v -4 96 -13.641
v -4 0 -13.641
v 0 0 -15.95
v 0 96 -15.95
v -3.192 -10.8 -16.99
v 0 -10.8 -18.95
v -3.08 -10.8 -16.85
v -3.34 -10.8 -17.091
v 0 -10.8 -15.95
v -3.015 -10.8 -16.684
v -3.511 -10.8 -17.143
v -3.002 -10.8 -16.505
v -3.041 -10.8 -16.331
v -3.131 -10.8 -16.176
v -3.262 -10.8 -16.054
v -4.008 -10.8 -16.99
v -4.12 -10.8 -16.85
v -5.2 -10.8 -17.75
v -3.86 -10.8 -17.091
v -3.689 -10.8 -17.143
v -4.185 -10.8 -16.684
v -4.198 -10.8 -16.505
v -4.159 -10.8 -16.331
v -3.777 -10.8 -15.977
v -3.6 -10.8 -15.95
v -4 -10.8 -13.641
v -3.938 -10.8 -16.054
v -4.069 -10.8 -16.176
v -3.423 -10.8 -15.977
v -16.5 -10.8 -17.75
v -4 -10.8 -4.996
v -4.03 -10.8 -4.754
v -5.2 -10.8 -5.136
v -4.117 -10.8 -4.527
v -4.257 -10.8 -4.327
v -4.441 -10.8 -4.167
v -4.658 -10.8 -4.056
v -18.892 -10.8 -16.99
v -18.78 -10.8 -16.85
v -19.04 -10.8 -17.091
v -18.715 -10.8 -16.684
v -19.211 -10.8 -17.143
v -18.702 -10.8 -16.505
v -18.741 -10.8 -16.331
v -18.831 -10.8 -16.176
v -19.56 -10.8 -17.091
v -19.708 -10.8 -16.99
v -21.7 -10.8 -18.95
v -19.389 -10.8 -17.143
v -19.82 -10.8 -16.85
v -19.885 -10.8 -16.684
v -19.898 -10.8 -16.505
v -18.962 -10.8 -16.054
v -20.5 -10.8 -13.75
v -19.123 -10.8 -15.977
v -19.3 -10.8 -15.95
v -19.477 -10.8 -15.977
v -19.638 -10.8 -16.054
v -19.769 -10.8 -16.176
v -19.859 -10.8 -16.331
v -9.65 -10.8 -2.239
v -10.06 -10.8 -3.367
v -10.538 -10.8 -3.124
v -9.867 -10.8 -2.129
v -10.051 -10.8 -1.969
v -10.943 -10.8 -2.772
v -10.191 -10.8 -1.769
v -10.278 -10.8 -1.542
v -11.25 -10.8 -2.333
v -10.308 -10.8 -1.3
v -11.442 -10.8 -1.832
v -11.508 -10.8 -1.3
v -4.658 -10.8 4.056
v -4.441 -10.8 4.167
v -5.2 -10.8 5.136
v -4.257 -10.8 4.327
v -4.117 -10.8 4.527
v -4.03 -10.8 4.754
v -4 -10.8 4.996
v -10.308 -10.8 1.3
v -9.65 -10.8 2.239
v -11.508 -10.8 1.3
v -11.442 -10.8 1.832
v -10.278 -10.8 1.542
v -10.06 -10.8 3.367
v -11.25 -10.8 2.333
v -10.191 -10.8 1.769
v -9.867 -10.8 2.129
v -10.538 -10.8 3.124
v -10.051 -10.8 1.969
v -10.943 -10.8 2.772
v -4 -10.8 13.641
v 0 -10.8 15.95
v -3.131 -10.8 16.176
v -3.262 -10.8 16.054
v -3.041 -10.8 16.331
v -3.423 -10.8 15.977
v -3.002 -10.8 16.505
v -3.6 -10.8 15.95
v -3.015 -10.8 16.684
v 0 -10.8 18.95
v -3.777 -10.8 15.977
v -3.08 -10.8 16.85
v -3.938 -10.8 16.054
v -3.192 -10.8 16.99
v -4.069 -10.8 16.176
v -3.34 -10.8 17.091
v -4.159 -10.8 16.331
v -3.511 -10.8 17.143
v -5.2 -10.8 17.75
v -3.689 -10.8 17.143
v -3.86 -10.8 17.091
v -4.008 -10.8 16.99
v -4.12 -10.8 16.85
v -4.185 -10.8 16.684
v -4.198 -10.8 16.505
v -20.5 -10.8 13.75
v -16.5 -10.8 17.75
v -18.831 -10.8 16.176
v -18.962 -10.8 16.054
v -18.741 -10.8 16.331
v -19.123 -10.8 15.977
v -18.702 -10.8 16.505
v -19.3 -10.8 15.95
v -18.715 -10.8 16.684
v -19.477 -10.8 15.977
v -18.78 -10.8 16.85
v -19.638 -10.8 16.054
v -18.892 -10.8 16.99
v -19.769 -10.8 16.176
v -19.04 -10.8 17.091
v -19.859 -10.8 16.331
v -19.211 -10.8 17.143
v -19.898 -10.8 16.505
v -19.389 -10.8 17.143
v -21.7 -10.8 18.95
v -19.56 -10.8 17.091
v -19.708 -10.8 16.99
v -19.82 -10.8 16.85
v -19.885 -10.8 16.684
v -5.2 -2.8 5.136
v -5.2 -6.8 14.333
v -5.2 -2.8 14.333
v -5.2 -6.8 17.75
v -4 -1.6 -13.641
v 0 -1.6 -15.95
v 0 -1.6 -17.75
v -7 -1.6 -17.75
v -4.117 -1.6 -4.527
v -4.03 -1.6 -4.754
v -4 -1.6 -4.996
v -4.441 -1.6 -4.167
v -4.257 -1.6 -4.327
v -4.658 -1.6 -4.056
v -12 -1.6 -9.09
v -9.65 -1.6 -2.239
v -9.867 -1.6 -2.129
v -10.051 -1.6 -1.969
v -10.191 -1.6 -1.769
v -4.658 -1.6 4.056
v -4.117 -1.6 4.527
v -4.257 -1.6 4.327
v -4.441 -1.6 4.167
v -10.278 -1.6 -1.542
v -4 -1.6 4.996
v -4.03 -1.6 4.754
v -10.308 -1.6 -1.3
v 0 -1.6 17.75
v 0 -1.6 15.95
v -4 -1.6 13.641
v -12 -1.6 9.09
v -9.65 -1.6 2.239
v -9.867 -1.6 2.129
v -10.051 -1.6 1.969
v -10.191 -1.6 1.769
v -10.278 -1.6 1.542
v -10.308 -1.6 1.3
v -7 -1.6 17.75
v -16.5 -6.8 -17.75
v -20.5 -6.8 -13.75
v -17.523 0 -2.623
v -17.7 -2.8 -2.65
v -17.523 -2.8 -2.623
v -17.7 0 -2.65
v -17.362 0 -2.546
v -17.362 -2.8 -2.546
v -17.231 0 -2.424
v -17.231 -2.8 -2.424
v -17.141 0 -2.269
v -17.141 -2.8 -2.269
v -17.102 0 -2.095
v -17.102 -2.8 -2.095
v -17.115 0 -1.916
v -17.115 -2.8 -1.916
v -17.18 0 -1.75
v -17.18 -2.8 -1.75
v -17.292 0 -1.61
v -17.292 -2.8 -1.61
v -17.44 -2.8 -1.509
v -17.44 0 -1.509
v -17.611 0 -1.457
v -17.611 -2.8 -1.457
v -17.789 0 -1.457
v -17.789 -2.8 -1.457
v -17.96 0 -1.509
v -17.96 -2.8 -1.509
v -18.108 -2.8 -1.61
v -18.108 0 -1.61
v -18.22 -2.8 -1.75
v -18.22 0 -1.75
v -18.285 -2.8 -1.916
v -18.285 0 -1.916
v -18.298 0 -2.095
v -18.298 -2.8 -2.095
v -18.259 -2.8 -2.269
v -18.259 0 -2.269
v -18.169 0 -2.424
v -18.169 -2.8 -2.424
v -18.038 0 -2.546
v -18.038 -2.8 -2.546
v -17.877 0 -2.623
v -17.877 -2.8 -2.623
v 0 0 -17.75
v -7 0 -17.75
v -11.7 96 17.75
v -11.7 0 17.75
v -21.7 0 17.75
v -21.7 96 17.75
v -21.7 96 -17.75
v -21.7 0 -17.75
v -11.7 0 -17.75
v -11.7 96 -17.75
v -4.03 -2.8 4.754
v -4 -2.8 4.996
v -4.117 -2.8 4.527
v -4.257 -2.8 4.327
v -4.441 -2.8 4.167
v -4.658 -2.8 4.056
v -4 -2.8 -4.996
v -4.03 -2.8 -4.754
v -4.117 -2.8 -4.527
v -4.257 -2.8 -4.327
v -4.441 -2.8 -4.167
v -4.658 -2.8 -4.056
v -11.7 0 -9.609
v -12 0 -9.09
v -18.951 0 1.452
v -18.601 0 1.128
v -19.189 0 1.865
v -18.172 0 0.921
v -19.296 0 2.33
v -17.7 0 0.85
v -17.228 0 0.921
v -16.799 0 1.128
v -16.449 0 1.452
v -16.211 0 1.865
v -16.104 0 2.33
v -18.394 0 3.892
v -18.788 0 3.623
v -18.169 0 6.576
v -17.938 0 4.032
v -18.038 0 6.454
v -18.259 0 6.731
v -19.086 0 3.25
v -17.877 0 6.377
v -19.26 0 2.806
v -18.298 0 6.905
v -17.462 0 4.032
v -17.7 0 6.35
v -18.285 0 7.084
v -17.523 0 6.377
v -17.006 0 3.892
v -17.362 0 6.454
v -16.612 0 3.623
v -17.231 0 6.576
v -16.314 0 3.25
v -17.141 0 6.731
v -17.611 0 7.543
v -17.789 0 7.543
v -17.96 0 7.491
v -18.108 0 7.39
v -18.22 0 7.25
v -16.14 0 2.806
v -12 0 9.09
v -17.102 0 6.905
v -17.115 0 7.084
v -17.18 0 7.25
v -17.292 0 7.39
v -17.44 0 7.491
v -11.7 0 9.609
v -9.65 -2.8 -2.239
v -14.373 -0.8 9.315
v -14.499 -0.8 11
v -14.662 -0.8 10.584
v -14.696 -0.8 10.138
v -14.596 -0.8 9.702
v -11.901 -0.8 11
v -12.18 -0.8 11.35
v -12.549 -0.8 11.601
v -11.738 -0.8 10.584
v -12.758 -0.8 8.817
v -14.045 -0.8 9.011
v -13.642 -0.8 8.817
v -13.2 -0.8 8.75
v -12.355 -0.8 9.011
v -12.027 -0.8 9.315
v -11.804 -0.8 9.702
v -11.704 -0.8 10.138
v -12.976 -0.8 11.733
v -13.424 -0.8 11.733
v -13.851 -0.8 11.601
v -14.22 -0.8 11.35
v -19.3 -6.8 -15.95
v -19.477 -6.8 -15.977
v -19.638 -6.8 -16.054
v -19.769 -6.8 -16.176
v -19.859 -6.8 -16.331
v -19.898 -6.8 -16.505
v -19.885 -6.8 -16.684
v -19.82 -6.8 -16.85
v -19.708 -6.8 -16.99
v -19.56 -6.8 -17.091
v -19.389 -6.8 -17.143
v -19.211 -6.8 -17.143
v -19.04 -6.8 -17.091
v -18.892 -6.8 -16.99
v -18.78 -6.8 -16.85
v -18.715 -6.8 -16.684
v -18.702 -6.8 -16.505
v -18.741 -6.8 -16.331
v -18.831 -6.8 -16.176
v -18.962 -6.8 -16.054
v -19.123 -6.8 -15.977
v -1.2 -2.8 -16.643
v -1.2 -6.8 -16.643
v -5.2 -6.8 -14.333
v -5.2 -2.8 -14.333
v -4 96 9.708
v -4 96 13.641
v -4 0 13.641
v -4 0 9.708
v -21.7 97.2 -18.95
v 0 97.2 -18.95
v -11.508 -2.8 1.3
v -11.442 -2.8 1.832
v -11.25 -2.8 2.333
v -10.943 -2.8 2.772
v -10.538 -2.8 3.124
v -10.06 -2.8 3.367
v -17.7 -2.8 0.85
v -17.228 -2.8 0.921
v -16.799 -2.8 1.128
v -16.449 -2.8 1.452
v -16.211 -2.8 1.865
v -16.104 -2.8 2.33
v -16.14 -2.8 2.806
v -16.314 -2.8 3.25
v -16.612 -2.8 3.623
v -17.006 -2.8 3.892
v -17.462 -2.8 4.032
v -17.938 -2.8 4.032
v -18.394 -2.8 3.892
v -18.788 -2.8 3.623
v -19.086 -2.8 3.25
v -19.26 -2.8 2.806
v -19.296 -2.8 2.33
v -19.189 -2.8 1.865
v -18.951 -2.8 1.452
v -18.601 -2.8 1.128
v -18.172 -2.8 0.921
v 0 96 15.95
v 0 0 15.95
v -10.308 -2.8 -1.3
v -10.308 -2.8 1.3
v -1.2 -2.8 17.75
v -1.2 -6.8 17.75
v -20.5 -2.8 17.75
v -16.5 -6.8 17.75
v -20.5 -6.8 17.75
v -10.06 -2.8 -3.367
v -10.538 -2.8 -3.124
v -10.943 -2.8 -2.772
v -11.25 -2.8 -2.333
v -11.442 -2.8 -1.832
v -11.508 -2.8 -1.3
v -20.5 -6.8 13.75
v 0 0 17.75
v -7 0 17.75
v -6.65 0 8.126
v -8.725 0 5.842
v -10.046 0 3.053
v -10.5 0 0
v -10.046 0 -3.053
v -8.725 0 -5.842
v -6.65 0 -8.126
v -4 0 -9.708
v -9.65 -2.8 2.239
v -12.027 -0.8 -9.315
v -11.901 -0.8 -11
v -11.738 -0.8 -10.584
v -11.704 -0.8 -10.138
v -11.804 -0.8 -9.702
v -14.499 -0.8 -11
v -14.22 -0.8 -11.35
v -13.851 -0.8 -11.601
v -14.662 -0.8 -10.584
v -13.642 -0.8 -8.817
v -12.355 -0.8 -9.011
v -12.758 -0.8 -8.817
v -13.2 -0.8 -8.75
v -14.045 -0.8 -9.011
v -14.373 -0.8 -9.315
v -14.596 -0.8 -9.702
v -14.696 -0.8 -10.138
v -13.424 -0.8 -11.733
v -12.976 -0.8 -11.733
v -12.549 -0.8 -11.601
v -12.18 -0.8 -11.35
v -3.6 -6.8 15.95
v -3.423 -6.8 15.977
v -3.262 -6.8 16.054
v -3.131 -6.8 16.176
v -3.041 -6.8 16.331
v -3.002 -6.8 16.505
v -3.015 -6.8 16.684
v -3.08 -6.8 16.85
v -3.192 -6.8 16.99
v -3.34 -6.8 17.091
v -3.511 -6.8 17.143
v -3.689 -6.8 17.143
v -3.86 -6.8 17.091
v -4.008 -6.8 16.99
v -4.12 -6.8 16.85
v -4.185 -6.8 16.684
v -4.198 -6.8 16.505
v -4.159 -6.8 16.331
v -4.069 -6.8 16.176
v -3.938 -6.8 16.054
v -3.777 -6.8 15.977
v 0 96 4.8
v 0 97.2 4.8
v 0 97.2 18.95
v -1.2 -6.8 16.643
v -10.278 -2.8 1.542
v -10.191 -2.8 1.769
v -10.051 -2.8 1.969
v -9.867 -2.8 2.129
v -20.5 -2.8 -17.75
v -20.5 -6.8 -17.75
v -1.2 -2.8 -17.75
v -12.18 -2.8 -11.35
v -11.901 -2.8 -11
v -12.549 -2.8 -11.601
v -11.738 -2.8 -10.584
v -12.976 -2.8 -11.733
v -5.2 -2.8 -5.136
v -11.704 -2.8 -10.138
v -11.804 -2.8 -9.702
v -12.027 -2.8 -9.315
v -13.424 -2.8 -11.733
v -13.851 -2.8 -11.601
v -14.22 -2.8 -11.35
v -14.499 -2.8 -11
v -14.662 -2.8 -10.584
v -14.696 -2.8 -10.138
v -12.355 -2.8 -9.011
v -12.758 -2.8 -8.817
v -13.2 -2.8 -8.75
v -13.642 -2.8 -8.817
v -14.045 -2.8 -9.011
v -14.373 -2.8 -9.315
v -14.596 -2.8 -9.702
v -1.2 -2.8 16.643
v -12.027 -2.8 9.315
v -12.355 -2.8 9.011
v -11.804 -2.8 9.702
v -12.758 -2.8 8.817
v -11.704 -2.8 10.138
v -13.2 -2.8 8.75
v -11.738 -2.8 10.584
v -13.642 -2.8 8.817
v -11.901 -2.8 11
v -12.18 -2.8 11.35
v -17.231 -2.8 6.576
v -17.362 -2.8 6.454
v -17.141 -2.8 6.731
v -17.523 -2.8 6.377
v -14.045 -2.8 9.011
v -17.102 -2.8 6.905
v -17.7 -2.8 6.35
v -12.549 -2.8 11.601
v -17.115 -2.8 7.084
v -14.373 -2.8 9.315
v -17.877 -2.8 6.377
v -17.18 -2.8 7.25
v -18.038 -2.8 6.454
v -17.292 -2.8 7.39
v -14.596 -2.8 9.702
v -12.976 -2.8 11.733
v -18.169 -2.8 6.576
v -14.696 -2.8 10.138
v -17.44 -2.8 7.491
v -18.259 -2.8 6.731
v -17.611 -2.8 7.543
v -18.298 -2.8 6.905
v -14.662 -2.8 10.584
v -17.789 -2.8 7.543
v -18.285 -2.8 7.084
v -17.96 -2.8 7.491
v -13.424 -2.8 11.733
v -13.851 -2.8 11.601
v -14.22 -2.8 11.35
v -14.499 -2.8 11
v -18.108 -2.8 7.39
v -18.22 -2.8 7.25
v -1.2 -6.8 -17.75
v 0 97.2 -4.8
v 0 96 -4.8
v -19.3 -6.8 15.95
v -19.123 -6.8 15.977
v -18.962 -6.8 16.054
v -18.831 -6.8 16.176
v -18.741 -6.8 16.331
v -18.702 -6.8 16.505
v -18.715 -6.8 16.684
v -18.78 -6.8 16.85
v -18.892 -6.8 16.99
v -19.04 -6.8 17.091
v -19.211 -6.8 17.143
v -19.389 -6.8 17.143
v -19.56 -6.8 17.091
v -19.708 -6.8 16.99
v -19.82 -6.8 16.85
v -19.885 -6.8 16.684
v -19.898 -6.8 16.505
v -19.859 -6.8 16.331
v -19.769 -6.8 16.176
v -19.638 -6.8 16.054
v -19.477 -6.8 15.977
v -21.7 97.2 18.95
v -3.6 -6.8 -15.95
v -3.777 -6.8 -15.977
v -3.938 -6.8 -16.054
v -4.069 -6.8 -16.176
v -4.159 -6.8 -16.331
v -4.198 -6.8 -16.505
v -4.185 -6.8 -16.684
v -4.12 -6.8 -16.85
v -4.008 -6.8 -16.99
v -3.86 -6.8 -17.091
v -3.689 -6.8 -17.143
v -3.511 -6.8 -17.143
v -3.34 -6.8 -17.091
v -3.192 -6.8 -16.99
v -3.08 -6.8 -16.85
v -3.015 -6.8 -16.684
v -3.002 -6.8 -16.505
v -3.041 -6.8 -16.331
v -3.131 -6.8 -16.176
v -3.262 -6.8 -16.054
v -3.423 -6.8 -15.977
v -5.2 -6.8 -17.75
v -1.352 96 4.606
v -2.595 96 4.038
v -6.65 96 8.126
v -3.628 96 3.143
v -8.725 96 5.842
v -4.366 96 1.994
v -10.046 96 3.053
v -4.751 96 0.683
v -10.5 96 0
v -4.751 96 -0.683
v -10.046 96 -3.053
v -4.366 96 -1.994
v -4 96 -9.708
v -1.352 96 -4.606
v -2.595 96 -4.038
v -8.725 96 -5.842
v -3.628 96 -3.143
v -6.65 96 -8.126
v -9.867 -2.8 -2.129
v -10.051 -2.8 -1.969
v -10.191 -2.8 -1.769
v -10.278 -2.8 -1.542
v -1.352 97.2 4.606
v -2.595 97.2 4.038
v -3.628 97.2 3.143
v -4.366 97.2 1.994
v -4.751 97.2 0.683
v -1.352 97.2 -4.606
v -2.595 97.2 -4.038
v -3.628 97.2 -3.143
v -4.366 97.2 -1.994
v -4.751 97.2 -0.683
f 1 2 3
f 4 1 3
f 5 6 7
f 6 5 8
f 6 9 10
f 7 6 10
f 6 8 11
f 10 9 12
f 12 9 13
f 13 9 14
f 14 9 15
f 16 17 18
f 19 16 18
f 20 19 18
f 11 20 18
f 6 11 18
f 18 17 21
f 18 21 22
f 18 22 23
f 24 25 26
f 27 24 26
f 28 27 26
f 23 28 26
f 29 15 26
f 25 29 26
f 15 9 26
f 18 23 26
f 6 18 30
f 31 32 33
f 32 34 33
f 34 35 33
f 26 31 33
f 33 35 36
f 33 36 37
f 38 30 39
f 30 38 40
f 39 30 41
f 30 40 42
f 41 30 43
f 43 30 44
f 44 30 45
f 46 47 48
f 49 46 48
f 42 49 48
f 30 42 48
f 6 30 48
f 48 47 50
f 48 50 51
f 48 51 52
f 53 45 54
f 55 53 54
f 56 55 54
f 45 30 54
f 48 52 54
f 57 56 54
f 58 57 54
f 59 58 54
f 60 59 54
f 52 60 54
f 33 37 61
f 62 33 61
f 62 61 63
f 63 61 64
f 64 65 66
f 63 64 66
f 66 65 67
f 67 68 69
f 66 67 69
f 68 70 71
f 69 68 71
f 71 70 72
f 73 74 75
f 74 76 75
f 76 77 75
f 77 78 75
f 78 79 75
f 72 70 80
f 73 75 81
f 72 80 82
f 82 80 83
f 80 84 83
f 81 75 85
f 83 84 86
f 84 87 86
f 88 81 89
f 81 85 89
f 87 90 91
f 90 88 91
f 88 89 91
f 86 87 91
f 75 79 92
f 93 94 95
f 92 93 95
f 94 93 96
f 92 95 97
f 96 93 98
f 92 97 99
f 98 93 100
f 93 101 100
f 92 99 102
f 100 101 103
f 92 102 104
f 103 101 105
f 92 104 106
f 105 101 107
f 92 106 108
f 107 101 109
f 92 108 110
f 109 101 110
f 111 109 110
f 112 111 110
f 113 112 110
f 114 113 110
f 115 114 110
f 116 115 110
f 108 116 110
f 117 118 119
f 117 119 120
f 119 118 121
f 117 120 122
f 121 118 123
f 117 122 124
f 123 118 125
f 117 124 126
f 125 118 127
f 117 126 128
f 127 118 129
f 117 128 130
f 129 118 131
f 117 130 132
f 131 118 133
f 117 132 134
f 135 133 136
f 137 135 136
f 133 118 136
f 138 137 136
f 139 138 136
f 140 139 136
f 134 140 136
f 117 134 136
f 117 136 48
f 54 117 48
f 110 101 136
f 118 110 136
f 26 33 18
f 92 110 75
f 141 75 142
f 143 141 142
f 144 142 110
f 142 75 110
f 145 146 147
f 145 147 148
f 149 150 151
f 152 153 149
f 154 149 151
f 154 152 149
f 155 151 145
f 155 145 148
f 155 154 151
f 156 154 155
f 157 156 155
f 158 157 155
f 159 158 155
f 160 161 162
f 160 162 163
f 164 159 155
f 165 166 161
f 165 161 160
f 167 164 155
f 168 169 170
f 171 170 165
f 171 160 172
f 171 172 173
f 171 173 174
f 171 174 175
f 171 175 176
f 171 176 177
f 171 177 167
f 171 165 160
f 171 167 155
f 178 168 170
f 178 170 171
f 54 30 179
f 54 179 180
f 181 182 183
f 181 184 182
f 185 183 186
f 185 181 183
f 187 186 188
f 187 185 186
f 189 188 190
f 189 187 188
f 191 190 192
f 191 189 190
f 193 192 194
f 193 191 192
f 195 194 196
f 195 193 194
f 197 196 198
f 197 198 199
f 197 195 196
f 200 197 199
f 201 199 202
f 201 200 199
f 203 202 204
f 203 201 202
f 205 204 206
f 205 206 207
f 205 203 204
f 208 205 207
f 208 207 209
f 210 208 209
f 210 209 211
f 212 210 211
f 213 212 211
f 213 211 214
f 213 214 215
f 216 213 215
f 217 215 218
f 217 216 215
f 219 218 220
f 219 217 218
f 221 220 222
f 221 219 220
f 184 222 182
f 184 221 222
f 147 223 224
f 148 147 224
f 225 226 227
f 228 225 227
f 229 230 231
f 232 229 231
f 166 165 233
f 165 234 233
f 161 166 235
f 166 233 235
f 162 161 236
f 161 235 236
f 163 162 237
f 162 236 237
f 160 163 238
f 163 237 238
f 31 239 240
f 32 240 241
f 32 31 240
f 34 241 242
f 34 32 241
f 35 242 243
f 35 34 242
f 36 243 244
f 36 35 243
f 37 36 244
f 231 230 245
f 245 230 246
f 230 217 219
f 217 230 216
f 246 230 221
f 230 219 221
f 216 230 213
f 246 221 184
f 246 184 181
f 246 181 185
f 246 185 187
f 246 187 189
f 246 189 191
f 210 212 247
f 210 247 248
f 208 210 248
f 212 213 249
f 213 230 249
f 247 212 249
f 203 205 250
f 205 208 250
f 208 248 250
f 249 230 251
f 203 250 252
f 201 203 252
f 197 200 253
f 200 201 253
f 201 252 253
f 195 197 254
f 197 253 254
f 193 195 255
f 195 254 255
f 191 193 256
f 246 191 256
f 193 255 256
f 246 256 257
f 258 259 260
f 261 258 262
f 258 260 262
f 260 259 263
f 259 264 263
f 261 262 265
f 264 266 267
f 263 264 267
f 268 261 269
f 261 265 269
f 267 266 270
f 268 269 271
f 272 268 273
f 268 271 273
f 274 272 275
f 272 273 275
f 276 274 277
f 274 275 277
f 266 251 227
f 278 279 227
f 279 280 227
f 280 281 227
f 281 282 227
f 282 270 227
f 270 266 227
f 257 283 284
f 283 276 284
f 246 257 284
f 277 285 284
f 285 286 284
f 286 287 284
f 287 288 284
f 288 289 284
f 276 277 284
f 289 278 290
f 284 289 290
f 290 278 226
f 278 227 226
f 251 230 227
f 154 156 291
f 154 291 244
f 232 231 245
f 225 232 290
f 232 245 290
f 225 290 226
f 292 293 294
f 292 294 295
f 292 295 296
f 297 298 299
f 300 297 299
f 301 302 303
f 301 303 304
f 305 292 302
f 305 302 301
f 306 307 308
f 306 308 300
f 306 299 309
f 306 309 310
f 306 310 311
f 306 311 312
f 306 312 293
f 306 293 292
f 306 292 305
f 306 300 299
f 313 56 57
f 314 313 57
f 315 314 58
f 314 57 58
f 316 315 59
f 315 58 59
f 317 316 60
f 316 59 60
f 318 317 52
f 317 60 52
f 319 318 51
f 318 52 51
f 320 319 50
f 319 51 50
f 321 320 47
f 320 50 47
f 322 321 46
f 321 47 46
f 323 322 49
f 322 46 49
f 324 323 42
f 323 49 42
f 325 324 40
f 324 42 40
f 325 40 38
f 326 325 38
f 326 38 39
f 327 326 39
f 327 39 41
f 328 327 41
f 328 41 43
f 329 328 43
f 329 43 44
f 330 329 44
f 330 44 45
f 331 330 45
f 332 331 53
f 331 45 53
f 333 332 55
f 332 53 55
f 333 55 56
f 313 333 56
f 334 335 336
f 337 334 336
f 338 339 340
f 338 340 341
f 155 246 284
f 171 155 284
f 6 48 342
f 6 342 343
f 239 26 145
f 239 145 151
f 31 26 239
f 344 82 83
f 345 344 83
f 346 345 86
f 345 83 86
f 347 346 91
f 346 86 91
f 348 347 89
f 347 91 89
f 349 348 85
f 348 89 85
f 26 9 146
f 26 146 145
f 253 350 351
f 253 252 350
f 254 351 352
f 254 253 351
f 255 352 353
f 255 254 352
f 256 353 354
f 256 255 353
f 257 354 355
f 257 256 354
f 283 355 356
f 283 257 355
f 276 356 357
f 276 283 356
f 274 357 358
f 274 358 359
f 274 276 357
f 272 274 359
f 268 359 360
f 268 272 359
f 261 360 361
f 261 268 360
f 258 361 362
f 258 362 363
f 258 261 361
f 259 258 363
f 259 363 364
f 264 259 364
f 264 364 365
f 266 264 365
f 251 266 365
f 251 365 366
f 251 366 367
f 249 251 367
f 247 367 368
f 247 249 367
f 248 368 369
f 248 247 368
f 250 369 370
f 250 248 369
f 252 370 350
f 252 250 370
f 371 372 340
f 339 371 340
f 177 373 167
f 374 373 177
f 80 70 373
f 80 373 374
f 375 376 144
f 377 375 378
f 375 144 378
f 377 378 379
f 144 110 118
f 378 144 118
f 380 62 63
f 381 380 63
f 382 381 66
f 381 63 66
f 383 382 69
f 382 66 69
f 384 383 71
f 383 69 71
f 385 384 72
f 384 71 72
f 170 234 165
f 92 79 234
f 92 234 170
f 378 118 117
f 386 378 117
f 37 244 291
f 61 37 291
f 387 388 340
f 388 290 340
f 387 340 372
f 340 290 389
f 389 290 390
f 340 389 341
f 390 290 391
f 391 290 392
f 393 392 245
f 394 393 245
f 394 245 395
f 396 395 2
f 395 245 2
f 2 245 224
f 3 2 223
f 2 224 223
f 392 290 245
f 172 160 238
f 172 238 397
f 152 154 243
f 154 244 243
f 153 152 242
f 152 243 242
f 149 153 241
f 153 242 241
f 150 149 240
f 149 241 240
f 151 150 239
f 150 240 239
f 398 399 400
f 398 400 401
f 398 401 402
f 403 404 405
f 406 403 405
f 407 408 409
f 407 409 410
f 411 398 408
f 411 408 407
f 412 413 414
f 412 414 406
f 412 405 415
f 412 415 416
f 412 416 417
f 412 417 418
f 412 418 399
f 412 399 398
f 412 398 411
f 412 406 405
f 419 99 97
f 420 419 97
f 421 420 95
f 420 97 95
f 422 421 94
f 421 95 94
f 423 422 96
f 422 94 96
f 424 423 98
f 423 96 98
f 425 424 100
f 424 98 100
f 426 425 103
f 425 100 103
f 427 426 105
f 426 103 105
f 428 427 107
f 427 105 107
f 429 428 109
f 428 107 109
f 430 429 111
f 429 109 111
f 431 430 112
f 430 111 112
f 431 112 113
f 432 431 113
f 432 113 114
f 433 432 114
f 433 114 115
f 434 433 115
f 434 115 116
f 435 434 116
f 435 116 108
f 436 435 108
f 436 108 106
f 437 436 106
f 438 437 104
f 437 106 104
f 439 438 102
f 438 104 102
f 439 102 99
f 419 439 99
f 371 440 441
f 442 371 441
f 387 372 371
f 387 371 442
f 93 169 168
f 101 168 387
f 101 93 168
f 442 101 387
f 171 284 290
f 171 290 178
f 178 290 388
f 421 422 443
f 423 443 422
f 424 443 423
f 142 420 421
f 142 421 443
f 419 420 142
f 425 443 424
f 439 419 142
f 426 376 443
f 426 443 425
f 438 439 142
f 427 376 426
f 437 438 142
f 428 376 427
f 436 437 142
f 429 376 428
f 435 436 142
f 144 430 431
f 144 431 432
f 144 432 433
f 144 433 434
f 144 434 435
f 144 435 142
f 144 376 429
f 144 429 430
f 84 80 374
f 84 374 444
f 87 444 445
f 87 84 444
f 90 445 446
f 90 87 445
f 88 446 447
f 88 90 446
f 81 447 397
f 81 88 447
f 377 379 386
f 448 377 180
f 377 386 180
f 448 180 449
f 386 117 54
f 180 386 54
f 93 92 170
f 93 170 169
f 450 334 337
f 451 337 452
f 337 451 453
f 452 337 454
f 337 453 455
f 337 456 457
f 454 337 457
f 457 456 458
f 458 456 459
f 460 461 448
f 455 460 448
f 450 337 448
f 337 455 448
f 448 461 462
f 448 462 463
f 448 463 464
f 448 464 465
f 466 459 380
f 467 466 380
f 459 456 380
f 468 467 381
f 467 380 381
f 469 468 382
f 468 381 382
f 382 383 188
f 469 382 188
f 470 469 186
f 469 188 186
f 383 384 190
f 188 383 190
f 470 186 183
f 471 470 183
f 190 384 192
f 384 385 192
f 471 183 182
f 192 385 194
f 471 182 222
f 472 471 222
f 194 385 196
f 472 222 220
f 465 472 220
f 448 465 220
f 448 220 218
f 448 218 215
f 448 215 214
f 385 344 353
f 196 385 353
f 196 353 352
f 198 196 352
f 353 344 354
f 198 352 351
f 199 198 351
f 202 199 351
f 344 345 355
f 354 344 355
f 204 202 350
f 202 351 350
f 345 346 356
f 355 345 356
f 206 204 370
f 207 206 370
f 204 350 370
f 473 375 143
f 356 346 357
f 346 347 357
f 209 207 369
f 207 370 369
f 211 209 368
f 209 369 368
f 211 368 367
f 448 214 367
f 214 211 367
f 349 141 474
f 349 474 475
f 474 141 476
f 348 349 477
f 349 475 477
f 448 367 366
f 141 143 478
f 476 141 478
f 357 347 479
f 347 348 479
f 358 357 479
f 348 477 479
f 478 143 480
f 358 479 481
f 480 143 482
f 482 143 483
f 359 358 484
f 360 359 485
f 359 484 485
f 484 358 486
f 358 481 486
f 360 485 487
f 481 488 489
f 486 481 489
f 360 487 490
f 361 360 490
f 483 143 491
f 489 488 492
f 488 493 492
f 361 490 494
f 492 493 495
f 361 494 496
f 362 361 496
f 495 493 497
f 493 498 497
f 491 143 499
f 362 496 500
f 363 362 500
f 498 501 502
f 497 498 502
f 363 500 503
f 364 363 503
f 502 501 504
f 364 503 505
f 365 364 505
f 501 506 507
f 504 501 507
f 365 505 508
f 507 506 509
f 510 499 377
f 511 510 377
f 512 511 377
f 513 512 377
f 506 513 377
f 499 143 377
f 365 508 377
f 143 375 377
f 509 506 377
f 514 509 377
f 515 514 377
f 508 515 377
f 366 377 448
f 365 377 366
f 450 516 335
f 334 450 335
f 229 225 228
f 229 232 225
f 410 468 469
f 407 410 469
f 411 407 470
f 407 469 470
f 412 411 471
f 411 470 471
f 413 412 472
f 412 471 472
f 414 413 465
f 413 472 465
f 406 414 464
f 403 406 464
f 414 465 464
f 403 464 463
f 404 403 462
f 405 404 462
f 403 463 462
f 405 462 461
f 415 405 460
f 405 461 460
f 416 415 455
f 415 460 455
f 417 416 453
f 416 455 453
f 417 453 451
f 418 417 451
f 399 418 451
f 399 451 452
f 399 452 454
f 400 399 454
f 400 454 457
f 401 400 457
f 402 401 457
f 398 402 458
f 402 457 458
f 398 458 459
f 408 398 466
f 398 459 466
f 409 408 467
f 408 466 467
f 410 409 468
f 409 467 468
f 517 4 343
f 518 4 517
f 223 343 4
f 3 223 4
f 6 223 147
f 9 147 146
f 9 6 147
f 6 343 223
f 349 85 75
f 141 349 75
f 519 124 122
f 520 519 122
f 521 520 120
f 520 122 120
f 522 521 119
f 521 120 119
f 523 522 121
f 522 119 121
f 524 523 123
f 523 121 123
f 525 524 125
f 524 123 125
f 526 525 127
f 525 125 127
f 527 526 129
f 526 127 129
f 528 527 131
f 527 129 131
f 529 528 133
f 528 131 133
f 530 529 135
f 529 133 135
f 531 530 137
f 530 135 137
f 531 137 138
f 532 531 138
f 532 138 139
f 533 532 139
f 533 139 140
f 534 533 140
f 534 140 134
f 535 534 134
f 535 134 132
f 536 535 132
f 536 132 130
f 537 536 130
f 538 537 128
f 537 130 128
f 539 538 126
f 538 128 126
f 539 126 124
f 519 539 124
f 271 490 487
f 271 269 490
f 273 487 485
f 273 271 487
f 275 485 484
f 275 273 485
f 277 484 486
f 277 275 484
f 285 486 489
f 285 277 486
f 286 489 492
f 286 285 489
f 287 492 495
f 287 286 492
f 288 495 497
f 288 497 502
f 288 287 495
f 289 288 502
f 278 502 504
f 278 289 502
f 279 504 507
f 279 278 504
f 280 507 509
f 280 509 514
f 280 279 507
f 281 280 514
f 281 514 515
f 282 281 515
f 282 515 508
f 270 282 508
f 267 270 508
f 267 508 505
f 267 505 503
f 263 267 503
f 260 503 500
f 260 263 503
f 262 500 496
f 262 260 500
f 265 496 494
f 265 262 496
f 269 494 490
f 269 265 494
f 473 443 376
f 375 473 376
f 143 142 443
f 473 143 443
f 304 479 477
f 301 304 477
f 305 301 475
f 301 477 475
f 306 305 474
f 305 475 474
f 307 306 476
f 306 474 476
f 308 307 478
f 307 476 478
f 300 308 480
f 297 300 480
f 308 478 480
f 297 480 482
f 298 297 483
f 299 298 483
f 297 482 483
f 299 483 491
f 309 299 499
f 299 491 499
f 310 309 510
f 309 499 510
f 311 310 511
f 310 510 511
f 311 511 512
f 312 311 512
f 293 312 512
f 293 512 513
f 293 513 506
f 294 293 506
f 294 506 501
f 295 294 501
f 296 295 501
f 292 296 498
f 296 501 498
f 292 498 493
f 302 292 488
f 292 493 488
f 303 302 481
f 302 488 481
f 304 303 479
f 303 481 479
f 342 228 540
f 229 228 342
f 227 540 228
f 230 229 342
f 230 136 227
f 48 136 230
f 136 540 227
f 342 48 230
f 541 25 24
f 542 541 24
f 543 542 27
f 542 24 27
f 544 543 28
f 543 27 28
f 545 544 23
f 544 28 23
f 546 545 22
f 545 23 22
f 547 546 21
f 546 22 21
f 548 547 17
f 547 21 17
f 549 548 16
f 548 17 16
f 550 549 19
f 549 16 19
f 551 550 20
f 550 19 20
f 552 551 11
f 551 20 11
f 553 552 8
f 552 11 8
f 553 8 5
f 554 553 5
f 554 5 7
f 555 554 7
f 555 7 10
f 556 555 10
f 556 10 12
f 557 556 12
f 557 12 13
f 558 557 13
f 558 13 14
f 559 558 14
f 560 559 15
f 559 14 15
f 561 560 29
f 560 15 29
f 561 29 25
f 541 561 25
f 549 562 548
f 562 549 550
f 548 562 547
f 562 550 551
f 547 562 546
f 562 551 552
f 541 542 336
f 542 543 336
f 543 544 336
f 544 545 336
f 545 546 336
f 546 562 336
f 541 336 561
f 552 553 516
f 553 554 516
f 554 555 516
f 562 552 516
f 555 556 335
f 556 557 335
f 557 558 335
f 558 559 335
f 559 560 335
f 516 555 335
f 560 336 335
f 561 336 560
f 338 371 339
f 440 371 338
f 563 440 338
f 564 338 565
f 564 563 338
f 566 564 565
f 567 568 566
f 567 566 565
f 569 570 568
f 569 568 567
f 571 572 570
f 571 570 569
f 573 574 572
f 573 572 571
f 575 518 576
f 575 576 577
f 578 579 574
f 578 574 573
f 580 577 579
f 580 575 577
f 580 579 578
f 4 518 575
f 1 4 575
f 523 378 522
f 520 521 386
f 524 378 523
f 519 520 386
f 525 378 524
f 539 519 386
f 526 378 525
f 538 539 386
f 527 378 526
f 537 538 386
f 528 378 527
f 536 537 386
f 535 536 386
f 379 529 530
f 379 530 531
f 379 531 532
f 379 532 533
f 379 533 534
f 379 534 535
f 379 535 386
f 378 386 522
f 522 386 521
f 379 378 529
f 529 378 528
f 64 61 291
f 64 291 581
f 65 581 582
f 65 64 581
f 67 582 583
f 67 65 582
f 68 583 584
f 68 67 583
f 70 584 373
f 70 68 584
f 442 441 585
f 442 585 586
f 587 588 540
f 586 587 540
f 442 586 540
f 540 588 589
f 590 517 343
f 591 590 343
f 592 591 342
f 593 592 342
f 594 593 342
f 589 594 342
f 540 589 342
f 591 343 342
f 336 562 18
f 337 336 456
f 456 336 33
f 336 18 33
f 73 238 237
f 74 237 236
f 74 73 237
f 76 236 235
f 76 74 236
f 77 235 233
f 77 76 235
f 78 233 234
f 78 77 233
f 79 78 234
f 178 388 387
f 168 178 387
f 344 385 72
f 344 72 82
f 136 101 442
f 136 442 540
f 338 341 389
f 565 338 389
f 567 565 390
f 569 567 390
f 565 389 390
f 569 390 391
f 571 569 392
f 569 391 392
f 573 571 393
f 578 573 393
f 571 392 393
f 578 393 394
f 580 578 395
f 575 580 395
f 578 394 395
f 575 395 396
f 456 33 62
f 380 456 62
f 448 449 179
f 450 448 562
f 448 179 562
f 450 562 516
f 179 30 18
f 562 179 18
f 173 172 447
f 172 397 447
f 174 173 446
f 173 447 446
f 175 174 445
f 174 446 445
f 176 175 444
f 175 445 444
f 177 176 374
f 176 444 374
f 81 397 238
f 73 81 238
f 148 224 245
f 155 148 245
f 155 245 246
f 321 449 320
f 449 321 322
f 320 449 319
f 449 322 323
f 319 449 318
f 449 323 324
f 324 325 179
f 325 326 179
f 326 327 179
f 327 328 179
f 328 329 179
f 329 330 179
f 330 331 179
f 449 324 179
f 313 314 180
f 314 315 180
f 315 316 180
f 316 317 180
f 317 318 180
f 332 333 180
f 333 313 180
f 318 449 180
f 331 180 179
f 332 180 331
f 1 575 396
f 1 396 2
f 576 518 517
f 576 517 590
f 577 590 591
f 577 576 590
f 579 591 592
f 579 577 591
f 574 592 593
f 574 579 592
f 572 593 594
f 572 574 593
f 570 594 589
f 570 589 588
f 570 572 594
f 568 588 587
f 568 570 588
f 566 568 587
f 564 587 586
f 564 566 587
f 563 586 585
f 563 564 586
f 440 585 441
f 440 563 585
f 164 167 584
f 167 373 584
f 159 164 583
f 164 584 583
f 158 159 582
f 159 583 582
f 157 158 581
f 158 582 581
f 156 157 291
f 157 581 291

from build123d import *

# Parameters (mm, degrees)
EXTRUDE_1_DEPTH     = 96
EXTRUDE_2_DEPTH     = 1.2
SKETCH_3_R          = 1.6
SKETCH_3_R_2        = 0.6
EXTRUDE_3_DEPTH     = 1.6
SKETCH_4_R          = 0.6
SKETCH_4_R_2        = 1.6
EXTRUDE_4_DEPTH     = 1.2
FILLET_1_R          = 1
SKETCH_5_R          = 1.5
CUT_EXTRUDE_1_DEPTH = 2
SKETCH_6_R          = 1.5
CUT_EXTRUDE_2_DEPTH = 2
EXTRUDE_START       = 8
EXTRUDE_6_DEPTH     = 8
SKETCH_10_R         = 0.6
EXTRUDE_7_DEPTH     = 4


with BuildPart() as part:
    # Эскиз1 → Бобышка-Вытянуть1 (new body)
    with BuildSketch(Plane(origin=(0, 0, 0), x_dir=(1, 0, 0), z_dir=(0, 1, 0))):
        with BuildLine():
            Line((0, -18.95), (0, -15.95))
            Line((0, -15.95), (-4, -13.640598923))
            Line((-4, -13.640598923), (-4, -9.708243919))
            ThreePointArc((-4, -9.708243919), (-10.5, 0), (-4, 9.708243919))
            Line((-4, 9.708243919), (-4, 13.640598923))
            Line((-4, 13.640598923), (0, 15.95))
            Line((0, 15.95), (0, 18.95))
            Line((0, 18.95), (-21.7, 18.95))
            Line((-21.7, 18.95), (-21.7, 17.75))
            Line((-21.7, 17.75), (-11.7, 17.75))
            Line((-11.7, 17.75), (-11.7, -17.75))
            Line((-11.7, -17.75), (-21.7, -17.75))
            Line((-21.7, -17.75), (-21.7, -18.95))
            Line((-21.7, -18.95), (0, -18.95))
        make_face()
    extrude(amount=EXTRUDE_1_DEPTH)

    # Эскиз2 → Бобышка-Вытянуть2 (add)
    with BuildSketch(Plane(origin=(0, 96, 0), x_dir=(1, 0, 0), z_dir=(0, 1, 0))):
        with BuildLine():
            Line((0, -4.8), (0, -18.95))
            Line((0, -18.95), (-21.7, -18.95))
            Line((-21.7, -18.95), (-21.7, 18.95))
            Line((-21.7, 18.95), (0, 18.95))
            Line((0, 18.95), (0, 4.8))
            ThreePointArc((0, 4.8), (-4.8, 0), (0, -4.8))
        make_face()
    extrude(amount=EXTRUDE_2_DEPTH)

    # Эскиз3 → Бобышка-Вытянуть3 (add)
    with BuildSketch(Plane.XZ):
        Polygon((0, -18.95), (0, -17.75), (-7, -17.75), (-12, -9.089745962), (-12, 9.089745962), (-7, 17.75), (0, 17.75), (0, 18.95), (-21.7, 18.95), (-21.7, -18.95), align=None)
        with Locations(Location((-17.7, 2.45, 0), (0, 0, 270))):
            Circle(SKETCH_3_R, mode=Mode.SUBTRACT)
        with Locations(Location((-17.7, -2.05, 0), (0, 0, 270))):
            Circle(SKETCH_3_R_2, mode=Mode.SUBTRACT)
        with Locations(Location((-17.7, 6.95, 0), (0, 0, 270))):
            Circle(SKETCH_3_R_2, mode=Mode.SUBTRACT)
    extrude(amount=EXTRUDE_3_DEPTH)

    # Эскиз4 → Бобышка-Вытянуть4 (add)
    with BuildSketch(Plane.XZ.offset(1.6)):
        Polygon((0, -17.75), (0, -18.95), (-21.7, -18.95), (-21.7, 18.95), (0, 18.95), (0, 17.75), (0, 15.95), (-4, 13.640598923), (-4, 9.708243919), (-4, 4.295838364), (-10.307764064, 2), (-10.307764064, -2), (-4, -4.295838364), (-4, -9.708243919), (-4, -13.640598923), (0, -15.95), align=None)
        with Locations(Location((-17.7, 6.95, 0), (0, 0, 270))):
            Circle(SKETCH_4_R, mode=Mode.SUBTRACT)
        with Locations(Location((-17.7, 2.45, 0), (0, 0, 270))):
            Circle(SKETCH_4_R_2, mode=Mode.SUBTRACT)
        with Locations(Location((-17.7, -2.05, 0), (0, 0, 270))):
            Circle(SKETCH_4_R, mode=Mode.SUBTRACT)
    extrude(amount=EXTRUDE_4_DEPTH)

    # Скругление1
    fillet_1_edges = [part.edges().sort_by_distance(p)[0] for p in [
        (-4, -2.2, -4.295838364),
        (-10.307764064, -2.2, -2),
        (-10.307764064, -2.2, 2),
        (-4, -2.2, 4.295838364),
    ]]
    fillet(fillet_1_edges, radius=FILLET_1_R)

    # Эскиз5 → Вырез-Вытянуть1 (cut)
    with BuildSketch(Plane.XZ.offset(2.8)):
        with Locations(Location((-13.2, 10.25, 0), (0, 0, 270))):
            Circle(SKETCH_5_R)
    extrude(amount=-CUT_EXTRUDE_1_DEPTH, mode=Mode.SUBTRACT)

    # Эскиз6 → Вырез-Вытянуть2 (cut)
    with BuildSketch(Plane.XZ.offset(2.8)):
        with Locations(Location((-13.2, -10.25, 0), (0, 0, 90))):
            Circle(SKETCH_6_R)
    extrude(amount=-CUT_EXTRUDE_2_DEPTH, mode=Mode.SUBTRACT)

    # Эскиз9 → Бобышка-Вытянуть6 (add)
    with BuildSketch(Plane.XZ.offset(2.8).offset(EXTRUDE_START)):
        with BuildLine():
            Line((-9.649784207, 2.239485083), (-4.657979857, 4.056353282))
            ThreePointArc((-4.657979857, 4.056353282), (-4.180847956, 4.422469466), (-4, 4.996045902))
            Line((-4, 4.996045902), (-4, 13.640598923))
            Line((-4, 13.640598923), (0, 15.95))
            Line((0, 15.95), (0, 18.95))
            Line((0, 18.95), (-21.7, 18.95))
            Line((-21.7, 18.95), (-21.7, -18.95))
            Line((-21.7, -18.95), (0, -18.95))
            Line((0, -18.95), (0, -15.95))
            Line((0, -15.95), (-4, -13.640598923))
            Line((-4, -13.640598923), (-4, -4.996045902))
            ThreePointArc((-4, -4.996045902), (-4.180847956, -4.422469466), (-4.657979857, -4.056353282))
            Line((-4.657979857, -4.056353282), (-9.649784207, -2.239485083))
            ThreePointArc((-9.649784207, -2.239485083), (-10.126916108, -1.873368898), (-10.307764064, -1.299792462))
            Line((-10.307764064, -1.299792462), (-10.307764064, 1.299792462))
            ThreePointArc((-10.307764064, 1.299792462), (-10.126916108, 1.873368898), (-9.649784207, 2.239485083))
        make_face()
        with BuildLine():
            Line((-1.2, 16.642820323), (-1.2, 17.75))
            Line((-1.2, 17.75), (-20.5, 17.75))
            Line((-20.5, 17.75), (-20.5, -17.75))
            Line((-20.5, -17.75), (-1.2, -17.75))
            Line((-1.2, -17.75), (-1.2, -16.642820323))
            Line((-1.2, -16.642820323), (-5.2, -14.333419246))
            Line((-5.2, -14.333419246), (-5.2, -5.13608741))
            Line((-5.2, -5.13608741), (-10.060208379, -3.367116228))
            ThreePointArc((-10.060208379, -3.367116228), (-11.109898561, -2.561660622), (-11.507764064, -1.299792462))
            Line((-11.507764064, -1.299792462), (-11.507764064, 1.299792462))
            ThreePointArc((-11.507764064, 1.299792462), (-11.109898561, 2.561660622), (-10.060208379, 3.367116228))
            Line((-10.060208379, 3.367116228), (-5.2, 5.13608741))
            Line((-5.2, 5.13608741), (-5.2, 14.333419246))
            Line((-5.2, 14.333419246), (-1.2, 16.642820323))
        make_face(mode=Mode.SUBTRACT)
    extrude(amount=-EXTRUDE_6_DEPTH)

    # Эскиз10 → Бобышка-Вытянуть7 (add)
    # profile 1 of 4: a face of its own
    with BuildSketch(Plane.XZ.offset(10.8)):
        Polygon((-1.2, 17.75), (-1.2, 16.642820323), (-5.2, 14.333419246), (-5.2, 17.75), align=None)
        with Locations(Location((-3.6, 16.55, 0), (0, 0, 270))):
            Circle(SKETCH_10_R, mode=Mode.SUBTRACT)
    # profile 2 of 4: a face of its own
    with BuildSketch(Plane.XZ.offset(10.8)):
        Polygon((-16.5, 17.75), (-20.5, 13.75), (-20.5, 17.75), align=None)
        with Locations(Location((-19.3, 16.55, 0), (0, 0, 270))):
            Circle(SKETCH_10_R, mode=Mode.SUBTRACT)
    # profile 3 of 4: a face of its own
    with BuildSketch(Plane.XZ.offset(10.8)):
        Polygon((-20.5, -13.75), (-20.5, -17.75), (-16.5, -17.75), align=None)
        with Locations(Location((-19.3, -16.55, 0), (0, 0, 90))):
            Circle(SKETCH_10_R, mode=Mode.SUBTRACT)
    # profile 4 of 4: a face of its own
    with BuildSketch(Plane.XZ.offset(10.8)):
        Polygon((-5.2, -14.333419246), (-5.2, -17.75), (-1.2, -17.75), (-1.2, -16.642820323), align=None)
        with Locations(Location((-3.6, -16.55, 0), (0, 0, 90))):
            Circle(SKETCH_10_R, mode=Mode.SUBTRACT)
    extrude(amount=-EXTRUDE_7_DEPTH)


solid = part.part
